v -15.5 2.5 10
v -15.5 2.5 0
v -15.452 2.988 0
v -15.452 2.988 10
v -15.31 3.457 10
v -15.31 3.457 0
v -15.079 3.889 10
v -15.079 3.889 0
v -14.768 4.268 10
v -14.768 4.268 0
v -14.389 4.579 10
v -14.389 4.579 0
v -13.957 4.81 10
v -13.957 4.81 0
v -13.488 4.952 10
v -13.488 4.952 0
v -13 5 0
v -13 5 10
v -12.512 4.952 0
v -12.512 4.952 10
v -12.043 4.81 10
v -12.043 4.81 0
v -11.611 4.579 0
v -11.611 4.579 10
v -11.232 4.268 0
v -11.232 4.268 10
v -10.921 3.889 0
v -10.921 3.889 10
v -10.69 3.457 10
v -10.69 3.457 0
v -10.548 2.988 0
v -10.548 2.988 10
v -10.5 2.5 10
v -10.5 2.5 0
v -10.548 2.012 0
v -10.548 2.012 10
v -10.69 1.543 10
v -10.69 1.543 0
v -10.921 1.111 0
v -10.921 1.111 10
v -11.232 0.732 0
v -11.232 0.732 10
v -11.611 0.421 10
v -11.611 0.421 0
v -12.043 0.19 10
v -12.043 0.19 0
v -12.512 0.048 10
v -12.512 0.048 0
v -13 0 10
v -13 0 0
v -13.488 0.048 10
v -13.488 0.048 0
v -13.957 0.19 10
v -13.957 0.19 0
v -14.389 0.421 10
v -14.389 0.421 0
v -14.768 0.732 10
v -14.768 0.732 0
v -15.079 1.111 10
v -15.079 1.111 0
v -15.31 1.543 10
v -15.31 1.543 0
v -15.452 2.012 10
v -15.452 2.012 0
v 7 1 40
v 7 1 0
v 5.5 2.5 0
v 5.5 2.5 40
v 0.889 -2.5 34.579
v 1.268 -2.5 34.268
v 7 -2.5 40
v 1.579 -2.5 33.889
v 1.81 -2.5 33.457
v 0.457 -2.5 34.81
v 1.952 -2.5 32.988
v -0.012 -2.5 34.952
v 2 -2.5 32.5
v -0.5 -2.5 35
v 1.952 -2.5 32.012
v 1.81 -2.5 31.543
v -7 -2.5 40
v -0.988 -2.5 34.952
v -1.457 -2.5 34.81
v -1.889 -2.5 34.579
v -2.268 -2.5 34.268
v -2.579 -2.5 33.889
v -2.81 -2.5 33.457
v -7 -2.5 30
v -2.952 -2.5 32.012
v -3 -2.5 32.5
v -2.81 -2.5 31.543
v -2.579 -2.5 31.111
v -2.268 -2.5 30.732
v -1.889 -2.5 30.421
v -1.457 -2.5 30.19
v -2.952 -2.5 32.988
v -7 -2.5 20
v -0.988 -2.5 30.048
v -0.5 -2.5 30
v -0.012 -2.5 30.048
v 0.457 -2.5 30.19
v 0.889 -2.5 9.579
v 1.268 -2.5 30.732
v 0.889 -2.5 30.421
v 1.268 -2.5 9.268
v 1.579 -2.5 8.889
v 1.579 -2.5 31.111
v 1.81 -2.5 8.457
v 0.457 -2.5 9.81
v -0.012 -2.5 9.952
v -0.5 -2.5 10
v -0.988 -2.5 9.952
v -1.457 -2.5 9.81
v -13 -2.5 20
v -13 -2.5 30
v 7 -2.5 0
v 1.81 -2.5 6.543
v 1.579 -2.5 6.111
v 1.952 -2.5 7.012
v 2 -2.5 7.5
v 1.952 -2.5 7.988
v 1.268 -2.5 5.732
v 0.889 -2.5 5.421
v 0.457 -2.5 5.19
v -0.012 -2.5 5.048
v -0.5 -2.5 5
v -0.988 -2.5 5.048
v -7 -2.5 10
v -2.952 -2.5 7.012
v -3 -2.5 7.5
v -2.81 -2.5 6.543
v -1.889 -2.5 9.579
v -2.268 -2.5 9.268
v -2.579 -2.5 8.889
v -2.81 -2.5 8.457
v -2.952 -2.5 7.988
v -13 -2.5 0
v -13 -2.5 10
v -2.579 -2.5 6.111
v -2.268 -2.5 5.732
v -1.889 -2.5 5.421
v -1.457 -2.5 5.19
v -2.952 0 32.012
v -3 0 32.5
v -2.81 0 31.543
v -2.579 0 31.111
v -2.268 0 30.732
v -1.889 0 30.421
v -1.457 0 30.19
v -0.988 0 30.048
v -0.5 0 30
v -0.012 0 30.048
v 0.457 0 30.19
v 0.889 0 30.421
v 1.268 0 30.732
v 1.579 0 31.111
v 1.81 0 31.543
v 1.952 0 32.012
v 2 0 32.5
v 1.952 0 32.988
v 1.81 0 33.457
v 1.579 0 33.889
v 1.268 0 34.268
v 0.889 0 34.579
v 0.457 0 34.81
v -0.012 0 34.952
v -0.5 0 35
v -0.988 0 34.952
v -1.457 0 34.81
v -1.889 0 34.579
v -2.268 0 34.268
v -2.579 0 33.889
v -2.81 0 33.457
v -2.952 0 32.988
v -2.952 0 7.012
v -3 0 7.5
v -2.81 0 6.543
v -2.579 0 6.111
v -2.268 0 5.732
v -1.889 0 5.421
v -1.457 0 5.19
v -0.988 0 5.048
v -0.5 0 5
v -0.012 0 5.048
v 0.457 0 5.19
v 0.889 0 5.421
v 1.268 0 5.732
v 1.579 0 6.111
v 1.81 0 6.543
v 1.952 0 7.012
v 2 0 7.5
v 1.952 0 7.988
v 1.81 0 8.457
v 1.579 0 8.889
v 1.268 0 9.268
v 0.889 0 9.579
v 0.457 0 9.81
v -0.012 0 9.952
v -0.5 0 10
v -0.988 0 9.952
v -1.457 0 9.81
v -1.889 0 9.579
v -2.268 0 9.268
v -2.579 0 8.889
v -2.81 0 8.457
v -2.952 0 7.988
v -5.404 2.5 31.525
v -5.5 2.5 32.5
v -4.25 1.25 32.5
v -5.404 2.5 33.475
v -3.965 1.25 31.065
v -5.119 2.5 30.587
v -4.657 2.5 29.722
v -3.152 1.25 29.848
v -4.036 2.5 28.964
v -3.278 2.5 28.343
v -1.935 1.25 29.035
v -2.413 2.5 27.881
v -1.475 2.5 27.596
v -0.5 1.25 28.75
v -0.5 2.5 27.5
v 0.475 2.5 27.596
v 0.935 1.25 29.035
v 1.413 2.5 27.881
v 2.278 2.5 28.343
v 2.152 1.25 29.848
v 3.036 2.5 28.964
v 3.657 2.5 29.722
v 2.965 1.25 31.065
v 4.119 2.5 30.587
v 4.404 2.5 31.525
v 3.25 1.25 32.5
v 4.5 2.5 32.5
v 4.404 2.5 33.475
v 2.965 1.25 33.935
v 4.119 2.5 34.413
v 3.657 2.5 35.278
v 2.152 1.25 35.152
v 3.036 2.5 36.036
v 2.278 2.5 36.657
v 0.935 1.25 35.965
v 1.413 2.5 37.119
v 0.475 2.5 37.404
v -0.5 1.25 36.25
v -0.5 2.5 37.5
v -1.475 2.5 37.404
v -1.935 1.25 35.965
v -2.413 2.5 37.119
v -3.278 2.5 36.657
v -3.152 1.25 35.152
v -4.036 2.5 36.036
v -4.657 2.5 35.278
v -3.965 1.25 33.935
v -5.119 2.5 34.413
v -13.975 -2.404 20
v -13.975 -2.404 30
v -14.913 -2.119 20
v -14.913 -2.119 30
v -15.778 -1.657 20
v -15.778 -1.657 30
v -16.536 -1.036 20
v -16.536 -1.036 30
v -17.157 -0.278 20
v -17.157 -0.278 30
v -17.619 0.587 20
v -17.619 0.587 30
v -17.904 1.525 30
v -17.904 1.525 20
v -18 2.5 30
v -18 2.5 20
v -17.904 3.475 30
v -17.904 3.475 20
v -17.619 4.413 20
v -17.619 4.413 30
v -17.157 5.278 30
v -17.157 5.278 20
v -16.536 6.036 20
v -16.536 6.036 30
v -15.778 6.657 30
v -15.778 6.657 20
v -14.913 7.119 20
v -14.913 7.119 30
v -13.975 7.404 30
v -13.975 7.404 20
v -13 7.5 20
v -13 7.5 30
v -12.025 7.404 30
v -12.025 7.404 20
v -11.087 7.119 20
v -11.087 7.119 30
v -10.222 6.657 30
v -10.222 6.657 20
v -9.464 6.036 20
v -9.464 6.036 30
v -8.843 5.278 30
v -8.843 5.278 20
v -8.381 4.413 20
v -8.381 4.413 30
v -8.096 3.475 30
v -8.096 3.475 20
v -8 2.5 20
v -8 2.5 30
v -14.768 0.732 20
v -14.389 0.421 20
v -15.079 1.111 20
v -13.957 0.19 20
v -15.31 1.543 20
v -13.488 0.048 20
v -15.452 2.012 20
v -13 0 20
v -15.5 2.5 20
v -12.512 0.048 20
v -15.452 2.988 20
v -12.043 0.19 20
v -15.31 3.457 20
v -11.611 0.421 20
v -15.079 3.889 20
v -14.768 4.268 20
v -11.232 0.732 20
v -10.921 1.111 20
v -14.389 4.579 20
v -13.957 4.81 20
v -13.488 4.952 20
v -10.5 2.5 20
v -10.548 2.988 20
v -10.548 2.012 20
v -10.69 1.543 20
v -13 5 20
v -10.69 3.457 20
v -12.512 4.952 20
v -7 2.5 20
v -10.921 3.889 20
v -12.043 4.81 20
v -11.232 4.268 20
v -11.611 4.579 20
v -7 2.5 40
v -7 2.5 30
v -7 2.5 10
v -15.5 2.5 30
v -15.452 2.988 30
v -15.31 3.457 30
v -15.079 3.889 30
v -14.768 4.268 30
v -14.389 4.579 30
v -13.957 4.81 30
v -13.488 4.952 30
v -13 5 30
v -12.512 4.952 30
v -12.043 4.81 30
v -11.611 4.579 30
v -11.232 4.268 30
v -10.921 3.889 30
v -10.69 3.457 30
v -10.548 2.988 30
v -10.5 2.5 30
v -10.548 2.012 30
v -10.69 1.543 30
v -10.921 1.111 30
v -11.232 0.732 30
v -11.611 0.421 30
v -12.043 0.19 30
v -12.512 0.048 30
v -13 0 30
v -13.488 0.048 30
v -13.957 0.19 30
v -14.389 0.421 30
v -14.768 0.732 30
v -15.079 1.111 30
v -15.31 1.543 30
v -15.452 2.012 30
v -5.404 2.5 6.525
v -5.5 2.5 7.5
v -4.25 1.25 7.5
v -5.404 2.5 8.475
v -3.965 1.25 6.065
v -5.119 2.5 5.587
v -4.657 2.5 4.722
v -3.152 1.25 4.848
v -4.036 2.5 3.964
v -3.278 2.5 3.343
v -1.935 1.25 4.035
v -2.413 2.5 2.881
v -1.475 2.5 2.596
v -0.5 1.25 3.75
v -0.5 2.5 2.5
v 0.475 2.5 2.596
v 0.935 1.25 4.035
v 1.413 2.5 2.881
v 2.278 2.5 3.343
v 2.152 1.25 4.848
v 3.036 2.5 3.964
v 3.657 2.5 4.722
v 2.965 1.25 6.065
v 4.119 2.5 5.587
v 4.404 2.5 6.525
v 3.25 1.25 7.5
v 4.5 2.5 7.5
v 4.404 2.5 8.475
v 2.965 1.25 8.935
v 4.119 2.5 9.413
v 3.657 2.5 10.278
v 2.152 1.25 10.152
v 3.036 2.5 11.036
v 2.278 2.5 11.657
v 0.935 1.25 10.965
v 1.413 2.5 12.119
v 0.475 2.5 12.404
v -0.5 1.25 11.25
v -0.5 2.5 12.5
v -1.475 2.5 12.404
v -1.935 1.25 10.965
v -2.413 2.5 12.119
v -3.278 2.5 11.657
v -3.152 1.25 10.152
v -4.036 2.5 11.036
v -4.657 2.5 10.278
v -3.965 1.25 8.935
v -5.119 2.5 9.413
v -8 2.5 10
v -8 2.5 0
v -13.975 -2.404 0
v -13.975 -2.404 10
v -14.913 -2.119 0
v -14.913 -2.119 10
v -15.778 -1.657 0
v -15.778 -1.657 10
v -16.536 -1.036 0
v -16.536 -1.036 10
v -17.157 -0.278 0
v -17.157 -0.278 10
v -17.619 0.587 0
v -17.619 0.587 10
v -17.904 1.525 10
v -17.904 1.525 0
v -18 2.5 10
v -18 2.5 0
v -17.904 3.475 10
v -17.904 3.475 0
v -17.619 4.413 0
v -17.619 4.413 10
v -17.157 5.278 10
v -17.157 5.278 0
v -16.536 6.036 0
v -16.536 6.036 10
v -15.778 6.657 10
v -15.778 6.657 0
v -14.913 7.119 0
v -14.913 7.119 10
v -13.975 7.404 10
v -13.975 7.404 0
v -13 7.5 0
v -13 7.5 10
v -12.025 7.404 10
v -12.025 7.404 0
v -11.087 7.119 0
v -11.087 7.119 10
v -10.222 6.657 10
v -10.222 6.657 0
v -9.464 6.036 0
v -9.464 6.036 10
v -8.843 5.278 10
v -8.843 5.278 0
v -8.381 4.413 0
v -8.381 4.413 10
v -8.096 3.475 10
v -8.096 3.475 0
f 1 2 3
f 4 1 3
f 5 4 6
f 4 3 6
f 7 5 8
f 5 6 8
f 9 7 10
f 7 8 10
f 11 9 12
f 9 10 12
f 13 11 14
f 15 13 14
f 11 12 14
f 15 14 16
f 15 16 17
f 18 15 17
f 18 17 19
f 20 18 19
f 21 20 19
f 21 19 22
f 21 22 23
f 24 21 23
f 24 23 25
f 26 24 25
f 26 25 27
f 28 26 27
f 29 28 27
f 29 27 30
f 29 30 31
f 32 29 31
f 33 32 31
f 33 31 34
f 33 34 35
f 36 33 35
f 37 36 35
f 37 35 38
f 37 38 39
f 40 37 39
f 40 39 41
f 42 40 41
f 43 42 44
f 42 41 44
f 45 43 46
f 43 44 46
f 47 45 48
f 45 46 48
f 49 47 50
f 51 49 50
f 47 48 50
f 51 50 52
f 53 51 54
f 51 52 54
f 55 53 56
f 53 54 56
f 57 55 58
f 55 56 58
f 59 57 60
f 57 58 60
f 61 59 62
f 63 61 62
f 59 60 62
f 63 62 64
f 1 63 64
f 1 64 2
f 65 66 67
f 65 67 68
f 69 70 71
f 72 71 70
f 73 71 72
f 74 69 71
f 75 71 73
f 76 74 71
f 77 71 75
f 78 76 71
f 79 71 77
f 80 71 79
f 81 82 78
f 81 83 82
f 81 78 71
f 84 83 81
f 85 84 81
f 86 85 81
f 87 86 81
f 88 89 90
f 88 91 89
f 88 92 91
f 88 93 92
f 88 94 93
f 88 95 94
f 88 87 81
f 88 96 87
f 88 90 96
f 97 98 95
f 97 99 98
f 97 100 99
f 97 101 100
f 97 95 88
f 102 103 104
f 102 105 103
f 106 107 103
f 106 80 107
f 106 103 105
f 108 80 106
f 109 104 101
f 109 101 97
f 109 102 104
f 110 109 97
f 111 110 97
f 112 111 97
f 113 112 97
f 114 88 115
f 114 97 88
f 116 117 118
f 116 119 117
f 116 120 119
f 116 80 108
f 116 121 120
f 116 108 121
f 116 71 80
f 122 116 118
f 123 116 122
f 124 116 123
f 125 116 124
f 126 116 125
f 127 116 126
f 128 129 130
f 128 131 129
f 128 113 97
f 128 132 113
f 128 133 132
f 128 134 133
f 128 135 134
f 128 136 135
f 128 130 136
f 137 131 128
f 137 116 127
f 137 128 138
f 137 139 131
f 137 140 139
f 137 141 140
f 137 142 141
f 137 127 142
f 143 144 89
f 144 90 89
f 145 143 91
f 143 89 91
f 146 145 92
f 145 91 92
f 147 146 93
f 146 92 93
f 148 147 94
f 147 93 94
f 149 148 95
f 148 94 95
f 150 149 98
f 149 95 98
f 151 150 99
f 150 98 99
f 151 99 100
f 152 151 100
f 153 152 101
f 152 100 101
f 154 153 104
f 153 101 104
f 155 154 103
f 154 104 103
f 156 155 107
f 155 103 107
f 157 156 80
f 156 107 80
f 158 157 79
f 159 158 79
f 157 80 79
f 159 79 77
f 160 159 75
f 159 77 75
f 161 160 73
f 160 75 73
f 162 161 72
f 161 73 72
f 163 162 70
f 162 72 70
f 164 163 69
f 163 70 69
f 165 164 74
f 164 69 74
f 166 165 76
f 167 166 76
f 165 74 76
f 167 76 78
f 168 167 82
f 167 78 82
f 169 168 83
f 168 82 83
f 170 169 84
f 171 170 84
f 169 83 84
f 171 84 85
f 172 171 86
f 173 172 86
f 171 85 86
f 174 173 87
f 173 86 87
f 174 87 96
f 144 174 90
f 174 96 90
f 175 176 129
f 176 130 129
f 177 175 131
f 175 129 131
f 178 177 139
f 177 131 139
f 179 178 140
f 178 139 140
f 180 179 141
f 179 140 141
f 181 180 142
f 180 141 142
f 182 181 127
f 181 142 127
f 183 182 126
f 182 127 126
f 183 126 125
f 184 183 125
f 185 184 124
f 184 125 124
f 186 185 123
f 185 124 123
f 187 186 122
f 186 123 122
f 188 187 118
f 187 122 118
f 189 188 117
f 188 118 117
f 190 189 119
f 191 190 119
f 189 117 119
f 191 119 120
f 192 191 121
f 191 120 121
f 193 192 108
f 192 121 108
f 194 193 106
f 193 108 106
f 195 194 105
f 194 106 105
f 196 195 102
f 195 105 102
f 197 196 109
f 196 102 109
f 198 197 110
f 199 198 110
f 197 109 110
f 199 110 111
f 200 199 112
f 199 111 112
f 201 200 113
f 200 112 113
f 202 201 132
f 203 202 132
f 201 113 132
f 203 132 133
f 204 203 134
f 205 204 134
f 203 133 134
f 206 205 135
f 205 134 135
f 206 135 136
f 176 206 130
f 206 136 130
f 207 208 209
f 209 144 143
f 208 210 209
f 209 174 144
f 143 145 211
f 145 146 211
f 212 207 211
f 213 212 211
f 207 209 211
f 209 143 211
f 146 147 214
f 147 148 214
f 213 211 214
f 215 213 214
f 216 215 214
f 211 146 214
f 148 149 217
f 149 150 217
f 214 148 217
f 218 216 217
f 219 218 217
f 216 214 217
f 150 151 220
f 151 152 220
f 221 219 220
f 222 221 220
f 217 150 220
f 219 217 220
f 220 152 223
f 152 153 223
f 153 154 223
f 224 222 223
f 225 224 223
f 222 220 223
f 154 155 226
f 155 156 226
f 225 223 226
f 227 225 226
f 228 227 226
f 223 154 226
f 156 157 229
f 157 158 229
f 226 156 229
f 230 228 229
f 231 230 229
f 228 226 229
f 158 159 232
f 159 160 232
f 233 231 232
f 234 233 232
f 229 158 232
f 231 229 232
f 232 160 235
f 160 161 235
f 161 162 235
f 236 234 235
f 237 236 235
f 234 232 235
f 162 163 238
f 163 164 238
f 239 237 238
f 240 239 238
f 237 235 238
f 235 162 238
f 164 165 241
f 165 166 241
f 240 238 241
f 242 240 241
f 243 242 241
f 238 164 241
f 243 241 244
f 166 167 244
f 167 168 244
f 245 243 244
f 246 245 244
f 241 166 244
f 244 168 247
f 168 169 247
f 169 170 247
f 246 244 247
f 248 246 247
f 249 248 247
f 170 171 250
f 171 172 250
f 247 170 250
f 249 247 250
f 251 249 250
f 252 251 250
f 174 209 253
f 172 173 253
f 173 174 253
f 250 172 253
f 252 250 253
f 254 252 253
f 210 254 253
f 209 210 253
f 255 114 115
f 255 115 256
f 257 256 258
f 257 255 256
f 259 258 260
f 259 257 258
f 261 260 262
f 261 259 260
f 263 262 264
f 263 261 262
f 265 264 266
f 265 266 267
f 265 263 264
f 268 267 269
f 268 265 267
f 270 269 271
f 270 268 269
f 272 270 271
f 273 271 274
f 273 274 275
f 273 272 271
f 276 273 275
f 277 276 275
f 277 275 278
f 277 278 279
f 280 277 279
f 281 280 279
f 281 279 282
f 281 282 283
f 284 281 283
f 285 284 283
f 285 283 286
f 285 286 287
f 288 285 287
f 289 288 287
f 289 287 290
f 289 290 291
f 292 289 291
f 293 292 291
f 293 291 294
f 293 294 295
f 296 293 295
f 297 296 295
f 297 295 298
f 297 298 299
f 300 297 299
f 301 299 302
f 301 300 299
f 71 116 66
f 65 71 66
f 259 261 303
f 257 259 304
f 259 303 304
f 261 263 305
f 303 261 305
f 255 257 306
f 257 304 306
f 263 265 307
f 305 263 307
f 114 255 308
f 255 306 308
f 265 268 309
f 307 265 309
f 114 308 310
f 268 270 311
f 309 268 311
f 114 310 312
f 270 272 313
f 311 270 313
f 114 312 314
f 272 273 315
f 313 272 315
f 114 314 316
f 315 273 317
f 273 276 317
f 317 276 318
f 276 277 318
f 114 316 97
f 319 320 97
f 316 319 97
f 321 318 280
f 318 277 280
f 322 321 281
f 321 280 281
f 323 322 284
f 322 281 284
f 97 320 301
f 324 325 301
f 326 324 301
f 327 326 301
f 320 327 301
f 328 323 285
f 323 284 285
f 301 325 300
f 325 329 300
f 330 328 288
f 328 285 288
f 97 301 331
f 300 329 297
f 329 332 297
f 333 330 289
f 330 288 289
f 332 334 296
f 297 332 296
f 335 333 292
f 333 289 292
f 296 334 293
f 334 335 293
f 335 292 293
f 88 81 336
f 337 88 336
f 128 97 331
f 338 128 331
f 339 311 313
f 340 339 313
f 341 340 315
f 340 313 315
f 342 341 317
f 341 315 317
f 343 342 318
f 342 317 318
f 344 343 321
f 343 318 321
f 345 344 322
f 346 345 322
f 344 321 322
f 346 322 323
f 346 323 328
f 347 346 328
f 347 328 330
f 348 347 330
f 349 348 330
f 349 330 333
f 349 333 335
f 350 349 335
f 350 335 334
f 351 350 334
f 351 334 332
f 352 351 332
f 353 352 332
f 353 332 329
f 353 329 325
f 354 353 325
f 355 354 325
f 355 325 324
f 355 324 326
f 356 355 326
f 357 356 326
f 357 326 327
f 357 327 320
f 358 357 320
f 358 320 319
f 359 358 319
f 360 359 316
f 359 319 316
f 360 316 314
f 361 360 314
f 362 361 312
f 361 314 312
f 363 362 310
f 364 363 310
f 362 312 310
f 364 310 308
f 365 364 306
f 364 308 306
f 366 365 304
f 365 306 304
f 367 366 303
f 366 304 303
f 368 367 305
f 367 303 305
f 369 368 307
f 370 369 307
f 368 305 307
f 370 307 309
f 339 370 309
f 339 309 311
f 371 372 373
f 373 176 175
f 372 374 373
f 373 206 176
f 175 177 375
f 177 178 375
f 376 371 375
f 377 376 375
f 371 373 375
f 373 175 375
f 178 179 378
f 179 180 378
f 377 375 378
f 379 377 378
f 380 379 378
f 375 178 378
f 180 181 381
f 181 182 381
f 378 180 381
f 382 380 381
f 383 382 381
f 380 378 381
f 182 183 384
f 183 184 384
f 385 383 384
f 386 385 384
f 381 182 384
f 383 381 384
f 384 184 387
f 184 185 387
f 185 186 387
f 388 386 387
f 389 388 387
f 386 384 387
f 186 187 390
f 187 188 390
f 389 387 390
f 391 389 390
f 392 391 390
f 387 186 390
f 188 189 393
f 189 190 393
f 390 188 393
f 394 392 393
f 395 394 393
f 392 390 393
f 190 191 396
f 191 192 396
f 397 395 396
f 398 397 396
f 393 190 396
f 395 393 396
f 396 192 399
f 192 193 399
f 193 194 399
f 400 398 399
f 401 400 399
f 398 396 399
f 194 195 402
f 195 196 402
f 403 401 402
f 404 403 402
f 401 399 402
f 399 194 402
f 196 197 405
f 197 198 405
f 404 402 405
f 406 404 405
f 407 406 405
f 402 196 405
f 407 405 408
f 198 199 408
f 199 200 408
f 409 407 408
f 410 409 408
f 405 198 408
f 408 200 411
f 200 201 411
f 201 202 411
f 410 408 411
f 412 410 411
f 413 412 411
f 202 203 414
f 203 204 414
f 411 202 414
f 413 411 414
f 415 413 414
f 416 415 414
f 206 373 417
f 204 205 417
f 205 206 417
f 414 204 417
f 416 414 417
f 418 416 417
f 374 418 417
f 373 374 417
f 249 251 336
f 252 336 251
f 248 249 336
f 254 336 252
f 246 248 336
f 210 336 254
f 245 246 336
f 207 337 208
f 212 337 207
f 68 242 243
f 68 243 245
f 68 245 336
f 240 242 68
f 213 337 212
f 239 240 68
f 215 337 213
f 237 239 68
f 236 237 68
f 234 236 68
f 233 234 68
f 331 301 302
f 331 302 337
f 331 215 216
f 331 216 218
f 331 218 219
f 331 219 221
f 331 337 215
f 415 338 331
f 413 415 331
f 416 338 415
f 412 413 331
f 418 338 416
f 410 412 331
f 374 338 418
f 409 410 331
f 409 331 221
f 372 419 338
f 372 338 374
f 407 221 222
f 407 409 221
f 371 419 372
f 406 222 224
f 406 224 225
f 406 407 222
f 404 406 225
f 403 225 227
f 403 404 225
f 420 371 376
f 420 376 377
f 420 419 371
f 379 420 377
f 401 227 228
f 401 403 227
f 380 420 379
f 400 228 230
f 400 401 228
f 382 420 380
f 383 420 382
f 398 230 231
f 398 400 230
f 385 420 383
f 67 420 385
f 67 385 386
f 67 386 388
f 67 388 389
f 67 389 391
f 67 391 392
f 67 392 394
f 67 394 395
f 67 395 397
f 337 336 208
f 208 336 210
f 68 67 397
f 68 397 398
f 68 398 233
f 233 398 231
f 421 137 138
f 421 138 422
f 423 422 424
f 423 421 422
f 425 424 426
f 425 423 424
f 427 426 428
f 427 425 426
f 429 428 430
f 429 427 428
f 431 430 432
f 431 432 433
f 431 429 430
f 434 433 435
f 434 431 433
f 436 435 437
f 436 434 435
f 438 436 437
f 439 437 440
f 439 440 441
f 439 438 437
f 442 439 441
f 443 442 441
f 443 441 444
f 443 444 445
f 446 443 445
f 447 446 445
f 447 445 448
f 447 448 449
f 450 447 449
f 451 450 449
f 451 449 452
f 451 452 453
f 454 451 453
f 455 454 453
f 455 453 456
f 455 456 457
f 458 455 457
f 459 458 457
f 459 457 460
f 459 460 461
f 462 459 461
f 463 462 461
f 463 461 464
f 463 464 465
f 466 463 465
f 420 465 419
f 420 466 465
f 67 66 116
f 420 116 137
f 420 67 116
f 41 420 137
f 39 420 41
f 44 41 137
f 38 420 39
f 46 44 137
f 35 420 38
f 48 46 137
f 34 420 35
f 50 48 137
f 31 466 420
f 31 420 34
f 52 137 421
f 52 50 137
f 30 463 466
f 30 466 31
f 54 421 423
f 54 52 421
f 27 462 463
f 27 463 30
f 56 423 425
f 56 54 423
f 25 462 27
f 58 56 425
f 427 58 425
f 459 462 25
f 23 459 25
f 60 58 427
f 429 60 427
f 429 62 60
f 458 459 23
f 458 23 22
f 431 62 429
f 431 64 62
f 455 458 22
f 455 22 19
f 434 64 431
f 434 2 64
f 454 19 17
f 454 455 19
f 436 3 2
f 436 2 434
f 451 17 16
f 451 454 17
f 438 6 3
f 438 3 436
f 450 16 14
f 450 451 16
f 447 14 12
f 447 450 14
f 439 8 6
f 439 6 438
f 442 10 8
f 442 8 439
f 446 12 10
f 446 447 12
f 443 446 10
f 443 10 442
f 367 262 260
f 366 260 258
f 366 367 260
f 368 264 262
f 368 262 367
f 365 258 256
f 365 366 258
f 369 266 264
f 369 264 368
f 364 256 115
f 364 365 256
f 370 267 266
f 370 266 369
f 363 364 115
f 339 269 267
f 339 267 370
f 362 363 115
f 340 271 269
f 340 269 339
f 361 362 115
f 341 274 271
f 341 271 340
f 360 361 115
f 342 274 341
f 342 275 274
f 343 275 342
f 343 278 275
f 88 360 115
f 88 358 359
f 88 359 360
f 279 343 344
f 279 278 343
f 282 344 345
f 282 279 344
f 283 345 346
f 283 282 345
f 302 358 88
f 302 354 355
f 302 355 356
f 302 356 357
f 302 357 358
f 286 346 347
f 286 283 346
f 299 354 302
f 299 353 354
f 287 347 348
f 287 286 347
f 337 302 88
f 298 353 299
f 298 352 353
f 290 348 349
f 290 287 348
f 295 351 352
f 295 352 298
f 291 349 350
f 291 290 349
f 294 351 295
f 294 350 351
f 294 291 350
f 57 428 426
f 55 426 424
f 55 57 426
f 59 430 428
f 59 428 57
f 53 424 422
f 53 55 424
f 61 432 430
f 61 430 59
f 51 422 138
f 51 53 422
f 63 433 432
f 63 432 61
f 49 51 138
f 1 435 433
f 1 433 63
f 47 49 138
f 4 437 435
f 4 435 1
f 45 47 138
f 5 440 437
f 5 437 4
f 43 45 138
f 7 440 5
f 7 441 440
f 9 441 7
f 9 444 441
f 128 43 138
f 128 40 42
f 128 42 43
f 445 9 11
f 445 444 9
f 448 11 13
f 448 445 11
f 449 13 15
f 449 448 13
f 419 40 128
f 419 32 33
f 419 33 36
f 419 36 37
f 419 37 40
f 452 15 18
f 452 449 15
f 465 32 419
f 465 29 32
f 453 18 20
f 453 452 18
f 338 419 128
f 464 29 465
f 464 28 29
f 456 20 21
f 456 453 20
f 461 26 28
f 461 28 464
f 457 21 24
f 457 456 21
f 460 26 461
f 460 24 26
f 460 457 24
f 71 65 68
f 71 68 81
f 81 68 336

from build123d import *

# Parameters (mm, degrees)
SKETCH_1_W                = 14
SKETCH_1_H                = 5
EXTRUDE_1_DEPTH           = 40
SKETCH_3_R                = 2.5
EXTRUDE_2_DEPTH           = 40
CUT_EXTRUDE_1_DEPTH       = 10
PATTERN_LINEAR_1_COUNT    = 2
PATTERN_LINEAR_1_PITCH    = 20
HOLE_WIZARD_1_D           = 5
HOLE_WIZARD_1_CSINK_D     = 10
HOLE_WIZARD_1_CSINK_ANGLE = 90
CHAMFER_2_SIZE            = 1.5


with BuildPart() as part:
    # 草图1 → 凸台-拉伸1 (new body)
    with BuildSketch(Plane.XY):
        Rectangle(SKETCH_1_W, SKETCH_1_H)
    extrude(amount=EXTRUDE_1_DEPTH)

    # 草图3 → 凸台-拉伸2 (add)
    with BuildSketch(Plane(origin=(0, 0, 0), x_dir=(-1, 0, 0), z_dir=(0, 0, -1))):
        with BuildLine():
            Line((8, 2.5), (7, 2.5))
            Line((7, 2.5), (7, -2.5))
            Line((7, -2.5), (13, -2.5))
            ThreePointArc((13, -2.5), (16.535533906, 6.035533906), (8, 2.5))
        make_face()
        with Locations((13, 2.5)):
            Circle(SKETCH_3_R, mode=Mode.SUBTRACT)
    extrude(amount=-EXTRUDE_2_DEPTH)

    # 草图4 → 切除-拉伸1 (cut)
    with BuildSketch(Plane.XY.offset(40)):
        Polygon((-7, 2.5), (-7, 10.867672428), (-20.063850781, 10.867672428), (-20.063850781, -3.934204251), (-7, -3.934204251), align=None)
    cut_extrude_1 = extrude(amount=-CUT_EXTRUDE_1_DEPTH, mode=Mode.SUBTRACT)

    # 阵列(线性)1: 切除-拉伸1 ×2
    with Locations(*[(0, 0, -i * PATTERN_LINEAR_1_PITCH) for i in range(1, PATTERN_LINEAR_1_COUNT)]):
        add(cut_extrude_1, mode=Mode.SUBTRACT)

    # 打孔尺寸(%根据十字)槽半沉头木螺钉的类型1 (through all)
    with Locations(Plane(origin=(0, 2.5, 0), x_dir=(1, 0, 0), z_dir=(0, 1, 0))):
        with Locations((-0.5, -32.5), (-0.5, -7.5)):
            CounterSinkHole(HOLE_WIZARD_1_D / 2, HOLE_WIZARD_1_CSINK_D / 2, counter_sink_angle=HOLE_WIZARD_1_CSINK_ANGLE)

    # 倒角2
    chamfer_2_edges = [part.edges().sort_by_distance(p)[0] for p in [
        (7, 2.5, 20),
    ]]
    chamfer(chamfer_2_edges, length=CHAMFER_2_SIZE)


solid = part.part
